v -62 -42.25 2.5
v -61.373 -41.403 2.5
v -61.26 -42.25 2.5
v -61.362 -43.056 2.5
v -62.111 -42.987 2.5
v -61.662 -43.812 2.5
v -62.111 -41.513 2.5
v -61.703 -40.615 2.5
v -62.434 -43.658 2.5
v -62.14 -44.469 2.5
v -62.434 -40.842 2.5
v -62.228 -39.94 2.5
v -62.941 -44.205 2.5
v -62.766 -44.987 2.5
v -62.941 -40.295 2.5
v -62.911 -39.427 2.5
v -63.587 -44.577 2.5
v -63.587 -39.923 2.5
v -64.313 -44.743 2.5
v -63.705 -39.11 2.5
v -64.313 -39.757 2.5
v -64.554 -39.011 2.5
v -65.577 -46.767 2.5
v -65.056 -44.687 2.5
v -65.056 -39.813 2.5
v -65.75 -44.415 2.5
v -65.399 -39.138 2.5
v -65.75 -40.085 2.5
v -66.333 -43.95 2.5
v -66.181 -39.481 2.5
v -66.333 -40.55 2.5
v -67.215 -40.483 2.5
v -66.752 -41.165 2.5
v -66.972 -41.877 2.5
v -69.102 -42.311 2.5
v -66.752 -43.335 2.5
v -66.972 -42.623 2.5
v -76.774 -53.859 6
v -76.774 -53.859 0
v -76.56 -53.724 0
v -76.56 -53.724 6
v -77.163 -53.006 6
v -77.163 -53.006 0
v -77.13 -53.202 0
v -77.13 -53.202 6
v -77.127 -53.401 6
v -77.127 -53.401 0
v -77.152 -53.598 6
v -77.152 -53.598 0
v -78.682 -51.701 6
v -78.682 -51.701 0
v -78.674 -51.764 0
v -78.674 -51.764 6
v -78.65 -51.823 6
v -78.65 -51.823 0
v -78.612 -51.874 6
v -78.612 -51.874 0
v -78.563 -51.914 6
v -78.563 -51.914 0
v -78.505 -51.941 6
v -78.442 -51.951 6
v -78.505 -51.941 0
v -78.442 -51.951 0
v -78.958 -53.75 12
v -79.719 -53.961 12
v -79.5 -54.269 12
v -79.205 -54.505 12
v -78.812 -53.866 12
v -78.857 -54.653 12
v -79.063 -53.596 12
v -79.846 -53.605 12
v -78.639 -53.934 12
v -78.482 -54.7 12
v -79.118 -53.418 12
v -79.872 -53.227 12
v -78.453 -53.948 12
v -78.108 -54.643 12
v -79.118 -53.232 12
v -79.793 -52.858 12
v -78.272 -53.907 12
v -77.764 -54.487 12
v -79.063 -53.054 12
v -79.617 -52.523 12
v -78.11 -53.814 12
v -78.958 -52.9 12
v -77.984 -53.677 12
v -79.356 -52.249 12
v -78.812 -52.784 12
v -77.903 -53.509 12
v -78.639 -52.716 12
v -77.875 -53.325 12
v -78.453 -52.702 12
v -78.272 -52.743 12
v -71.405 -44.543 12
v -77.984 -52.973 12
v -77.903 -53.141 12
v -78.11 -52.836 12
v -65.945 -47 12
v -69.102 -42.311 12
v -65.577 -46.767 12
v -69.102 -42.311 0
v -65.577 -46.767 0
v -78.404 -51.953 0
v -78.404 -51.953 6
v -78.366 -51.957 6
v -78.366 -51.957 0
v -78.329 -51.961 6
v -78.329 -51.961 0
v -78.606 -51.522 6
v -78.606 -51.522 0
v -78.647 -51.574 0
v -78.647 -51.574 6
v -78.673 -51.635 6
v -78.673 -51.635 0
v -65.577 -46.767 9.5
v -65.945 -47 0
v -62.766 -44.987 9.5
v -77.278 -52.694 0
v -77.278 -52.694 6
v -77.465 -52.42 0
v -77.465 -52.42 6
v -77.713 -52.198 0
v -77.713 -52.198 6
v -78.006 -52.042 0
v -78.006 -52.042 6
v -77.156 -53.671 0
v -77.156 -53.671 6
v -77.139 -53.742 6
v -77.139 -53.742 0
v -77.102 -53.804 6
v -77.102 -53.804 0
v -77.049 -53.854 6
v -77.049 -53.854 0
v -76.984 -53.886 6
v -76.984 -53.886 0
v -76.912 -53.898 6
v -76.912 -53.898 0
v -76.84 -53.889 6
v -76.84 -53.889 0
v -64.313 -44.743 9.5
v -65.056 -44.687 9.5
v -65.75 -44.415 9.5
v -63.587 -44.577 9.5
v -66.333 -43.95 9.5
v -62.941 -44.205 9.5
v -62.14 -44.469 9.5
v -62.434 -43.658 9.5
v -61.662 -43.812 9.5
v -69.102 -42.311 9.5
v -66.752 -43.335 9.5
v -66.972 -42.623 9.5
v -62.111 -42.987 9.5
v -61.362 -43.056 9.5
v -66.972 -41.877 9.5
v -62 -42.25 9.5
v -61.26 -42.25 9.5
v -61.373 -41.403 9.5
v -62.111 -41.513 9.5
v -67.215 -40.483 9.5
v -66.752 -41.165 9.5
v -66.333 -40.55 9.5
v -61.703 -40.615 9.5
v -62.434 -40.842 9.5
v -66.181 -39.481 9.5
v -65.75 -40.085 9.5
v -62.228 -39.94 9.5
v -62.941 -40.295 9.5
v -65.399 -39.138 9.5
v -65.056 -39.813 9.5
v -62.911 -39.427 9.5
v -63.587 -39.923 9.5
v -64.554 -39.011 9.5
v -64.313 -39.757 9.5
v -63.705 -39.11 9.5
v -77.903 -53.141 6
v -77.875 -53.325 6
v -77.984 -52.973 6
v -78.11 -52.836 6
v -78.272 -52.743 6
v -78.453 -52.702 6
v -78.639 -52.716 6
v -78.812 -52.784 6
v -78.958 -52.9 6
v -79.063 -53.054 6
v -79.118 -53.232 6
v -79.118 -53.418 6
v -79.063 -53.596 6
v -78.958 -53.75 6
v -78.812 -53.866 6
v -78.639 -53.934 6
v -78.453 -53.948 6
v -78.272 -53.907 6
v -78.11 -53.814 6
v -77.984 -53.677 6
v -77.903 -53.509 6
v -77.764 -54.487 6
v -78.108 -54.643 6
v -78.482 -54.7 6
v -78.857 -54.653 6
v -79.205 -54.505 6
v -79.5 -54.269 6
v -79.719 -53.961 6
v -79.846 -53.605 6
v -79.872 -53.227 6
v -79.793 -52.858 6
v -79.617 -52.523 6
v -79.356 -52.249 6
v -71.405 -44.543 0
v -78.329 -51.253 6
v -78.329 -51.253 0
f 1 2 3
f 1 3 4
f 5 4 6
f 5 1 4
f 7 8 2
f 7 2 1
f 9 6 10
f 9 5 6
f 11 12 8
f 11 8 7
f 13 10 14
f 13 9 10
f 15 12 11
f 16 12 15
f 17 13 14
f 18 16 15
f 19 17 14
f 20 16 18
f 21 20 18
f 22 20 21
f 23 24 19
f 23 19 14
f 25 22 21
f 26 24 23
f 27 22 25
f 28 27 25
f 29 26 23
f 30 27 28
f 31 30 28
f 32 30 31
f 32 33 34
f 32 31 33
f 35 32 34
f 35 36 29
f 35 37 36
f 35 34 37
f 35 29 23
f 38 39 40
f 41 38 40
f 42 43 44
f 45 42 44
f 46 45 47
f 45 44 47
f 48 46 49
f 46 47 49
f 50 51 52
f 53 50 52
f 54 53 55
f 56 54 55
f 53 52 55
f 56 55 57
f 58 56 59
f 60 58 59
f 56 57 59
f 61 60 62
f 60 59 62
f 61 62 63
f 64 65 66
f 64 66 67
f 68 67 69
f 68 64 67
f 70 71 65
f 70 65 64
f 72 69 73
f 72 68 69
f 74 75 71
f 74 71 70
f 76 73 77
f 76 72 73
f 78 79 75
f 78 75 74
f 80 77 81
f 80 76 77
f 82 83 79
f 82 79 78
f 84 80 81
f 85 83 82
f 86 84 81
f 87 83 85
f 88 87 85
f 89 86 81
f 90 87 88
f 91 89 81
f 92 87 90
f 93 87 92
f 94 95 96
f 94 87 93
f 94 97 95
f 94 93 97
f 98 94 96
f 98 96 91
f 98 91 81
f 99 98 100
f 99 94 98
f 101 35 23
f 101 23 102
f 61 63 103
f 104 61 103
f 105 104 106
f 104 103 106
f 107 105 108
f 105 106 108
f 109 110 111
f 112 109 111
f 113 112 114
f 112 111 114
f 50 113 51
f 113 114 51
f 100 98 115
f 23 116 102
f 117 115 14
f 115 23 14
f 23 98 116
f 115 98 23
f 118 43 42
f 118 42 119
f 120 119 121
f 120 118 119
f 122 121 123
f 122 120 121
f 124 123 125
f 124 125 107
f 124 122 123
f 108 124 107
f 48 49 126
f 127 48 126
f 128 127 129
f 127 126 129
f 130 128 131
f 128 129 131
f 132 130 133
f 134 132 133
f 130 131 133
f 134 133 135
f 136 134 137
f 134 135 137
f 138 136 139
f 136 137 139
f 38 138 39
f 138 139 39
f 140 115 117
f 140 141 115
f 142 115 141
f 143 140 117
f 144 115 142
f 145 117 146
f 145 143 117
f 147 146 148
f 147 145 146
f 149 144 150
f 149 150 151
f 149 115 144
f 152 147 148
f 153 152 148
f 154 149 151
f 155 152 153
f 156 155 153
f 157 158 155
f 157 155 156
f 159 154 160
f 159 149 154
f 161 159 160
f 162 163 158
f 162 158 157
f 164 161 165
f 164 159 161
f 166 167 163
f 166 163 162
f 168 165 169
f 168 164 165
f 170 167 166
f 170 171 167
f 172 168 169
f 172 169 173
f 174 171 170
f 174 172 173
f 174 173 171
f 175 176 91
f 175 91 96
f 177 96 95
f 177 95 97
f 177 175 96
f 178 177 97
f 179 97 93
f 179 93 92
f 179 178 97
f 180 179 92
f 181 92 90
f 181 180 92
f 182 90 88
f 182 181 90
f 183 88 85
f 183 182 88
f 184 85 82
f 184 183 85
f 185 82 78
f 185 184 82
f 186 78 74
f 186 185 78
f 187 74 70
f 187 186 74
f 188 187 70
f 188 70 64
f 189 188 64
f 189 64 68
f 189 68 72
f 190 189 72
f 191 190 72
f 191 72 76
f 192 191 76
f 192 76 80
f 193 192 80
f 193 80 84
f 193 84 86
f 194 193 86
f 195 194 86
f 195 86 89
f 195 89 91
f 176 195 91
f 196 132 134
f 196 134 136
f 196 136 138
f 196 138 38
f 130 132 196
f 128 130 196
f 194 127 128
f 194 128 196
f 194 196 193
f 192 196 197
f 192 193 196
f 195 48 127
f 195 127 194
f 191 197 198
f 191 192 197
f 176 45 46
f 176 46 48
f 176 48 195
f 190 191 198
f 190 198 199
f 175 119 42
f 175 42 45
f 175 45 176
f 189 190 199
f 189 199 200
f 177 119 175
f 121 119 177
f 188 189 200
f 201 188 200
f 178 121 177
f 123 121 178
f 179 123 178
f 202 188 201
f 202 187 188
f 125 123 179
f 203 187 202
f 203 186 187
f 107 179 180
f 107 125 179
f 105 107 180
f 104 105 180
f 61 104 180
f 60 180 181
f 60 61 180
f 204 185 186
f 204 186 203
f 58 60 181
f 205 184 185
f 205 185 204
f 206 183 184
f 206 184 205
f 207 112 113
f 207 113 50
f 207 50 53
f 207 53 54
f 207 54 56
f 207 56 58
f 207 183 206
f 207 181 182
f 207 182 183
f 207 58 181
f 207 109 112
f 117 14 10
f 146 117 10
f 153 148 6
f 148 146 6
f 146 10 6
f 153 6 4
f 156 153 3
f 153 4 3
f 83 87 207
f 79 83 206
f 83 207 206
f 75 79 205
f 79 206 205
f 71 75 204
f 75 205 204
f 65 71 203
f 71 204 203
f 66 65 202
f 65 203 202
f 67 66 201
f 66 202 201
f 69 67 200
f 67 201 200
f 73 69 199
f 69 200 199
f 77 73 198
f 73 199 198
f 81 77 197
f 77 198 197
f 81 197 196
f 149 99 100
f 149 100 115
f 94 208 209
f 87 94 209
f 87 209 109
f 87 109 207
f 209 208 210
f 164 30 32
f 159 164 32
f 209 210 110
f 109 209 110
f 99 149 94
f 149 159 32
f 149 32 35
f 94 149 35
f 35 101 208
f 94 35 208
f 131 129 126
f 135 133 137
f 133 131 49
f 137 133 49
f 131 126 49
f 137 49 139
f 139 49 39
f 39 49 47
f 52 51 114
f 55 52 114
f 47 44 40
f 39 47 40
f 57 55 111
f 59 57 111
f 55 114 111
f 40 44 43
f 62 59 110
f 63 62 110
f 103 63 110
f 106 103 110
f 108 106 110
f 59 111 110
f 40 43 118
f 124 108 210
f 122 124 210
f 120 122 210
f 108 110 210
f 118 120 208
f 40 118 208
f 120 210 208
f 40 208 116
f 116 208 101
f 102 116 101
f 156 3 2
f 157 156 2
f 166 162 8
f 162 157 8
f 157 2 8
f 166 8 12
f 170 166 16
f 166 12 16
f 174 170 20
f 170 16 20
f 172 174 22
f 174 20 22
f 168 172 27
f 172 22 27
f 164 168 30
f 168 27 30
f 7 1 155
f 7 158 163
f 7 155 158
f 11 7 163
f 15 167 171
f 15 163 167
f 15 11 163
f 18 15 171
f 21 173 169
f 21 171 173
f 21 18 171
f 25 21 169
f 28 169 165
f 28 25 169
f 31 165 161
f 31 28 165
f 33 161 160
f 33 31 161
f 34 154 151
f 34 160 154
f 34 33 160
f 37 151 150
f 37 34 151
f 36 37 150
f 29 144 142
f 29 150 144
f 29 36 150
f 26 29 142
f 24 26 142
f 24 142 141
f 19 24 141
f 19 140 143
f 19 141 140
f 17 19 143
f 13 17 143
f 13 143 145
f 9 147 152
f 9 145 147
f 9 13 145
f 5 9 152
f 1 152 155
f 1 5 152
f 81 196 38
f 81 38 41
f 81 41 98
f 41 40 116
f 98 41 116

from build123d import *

# Parameters (mm, degrees)
SKETCH_3_R               = 2.5
SKETCH_3_R_2             = 1.375
SKETCH_3_R_3             = 0.625
EXTRUDE_1_DEPTH          = 12
CUT_EXTRUDE_START        = -6
SKETCH_4_R               = 1.375
SKETCH_4_R_2             = 0.625
CUT_EXTRUDE_1_DEPTH      = 6
CUT_EXTRUDE_2_DEPTH      = 6
CUT_EXTRUDE_3_DEPTH      = 98.323451249
CUT_EXTRUDE_3_DEPTH_BACK = 98.323451249
SKETCH_9_W               = 7.034569735
SKETCH_9_H               = 2.5


with BuildPart() as part:
    # 草图3 → 凸台-拉伸1 (new body)
    # profile 1 of 4: a face of its own
    with BuildSketch(Plane.XY):
        with BuildLine():
            ThreePointArc((-61.260434814, -42.25), (-62.911250508, -39.426764685), (-66.181254237, -39.480854503))
            Line((-66.181254237, -39.480854503), (-67.215081256, -40.482765899))
            ThreePointArc((-67.215081256, -40.482765899), (-66.804847725, -44.526501605), (-62.766497887, -44.986741313))
            ThreePointArc((-62.766497887, -44.986741313), (-61.661816101, -43.8118882), (-61.260434814, -42.25))
        make_face()
        with Locations((-64.5, -42.25)):
            Circle(SKETCH_3_R, mode=Mode.SUBTRACT)
    # profile 2 of 4: a face of its own
    with BuildSketch(Plane.XY):
        with BuildLine():
            ThreePointArc((-62.766497887, -44.986741313), (-66.804847725, -44.526501605), (-67.215081256, -40.482765899))
            Line((-67.215081256, -40.482765899), (-71.404577544, -44.542926834))
            Line((-71.404577544, -44.542926834), (-68.869512223, -46.563873564))
            ThreePointArc((-68.869512223, -46.563873564), (-68.283195443, -46.88782244), (-67.622796748, -47))
            Line((-67.622796748, -47), (-65.944900832, -47))
            Line((-65.944900832, -47), (-62.766497887, -44.986741313))
        make_face()
    # profile 3 of 4: a face of its own
    with BuildSketch(Plane.XY):
        with Locations((-78.5, -53.325)):
            Circle(SKETCH_3_R_2)
        with Locations((-78.5, -53.325)):
            Circle(SKETCH_3_R_3, mode=Mode.SUBTRACT)
    # profile 4 of 4: a face of its own
    with BuildSketch(Plane.XY):
        with BuildLine():
            Line((-68.869512223, -46.563873564), (-71.404577544, -44.542926834))
            Line((-71.404577544, -44.542926834), (-79.356399518, -52.24926543))
            ThreePointArc((-79.356399518, -52.24926543), (-77.902892111, -52.086417274), (-77.125, -53.325))
            ThreePointArc((-77.125, -53.325), (-77.295362144, -53.987927323), (-77.764232924, -54.486581598))
            Line((-77.764232924, -54.486581598), (-65.944900832, -47))
            Line((-65.944900832, -47), (-67.622796748, -47))
            ThreePointArc((-67.622796748, -47), (-68.283195443, -46.88782244), (-68.869512223, -46.563873564))
        make_face()
    extrude(amount=EXTRUDE_1_DEPTH)

    # 草图4 → 切除-拉伸1 (cut)
    with BuildSketch(Plane.XY.offset(6).offset(CUT_EXTRUDE_START)):
        with Locations((-78.5, -53.325)):
            Circle(SKETCH_4_R)
        with Locations((-78.5, -53.325)):
            Circle(SKETCH_4_R_2, mode=Mode.SUBTRACT)
    extrude(amount=CUT_EXTRUDE_1_DEPTH, mode=Mode.SUBTRACT)

    # 草图5 → 切除-拉伸2 (cut)
    with BuildSketch(Plane(origin=(0, 0, 0), x_dir=(-1, 0, 0), z_dir=(0, 0, -1))):
        with BuildLine():
            Line((79.356399518, -52.24926543), (78.605866383, -51.521902256))
            ThreePointArc((78.605866383, -51.521902256), (78.66209541, -51.603950043), (78.681882496, -51.701428318))
            ThreePointArc((78.681882496, -51.701428318), (78.612326251, -51.874460255), (78.442362088, -51.951208578))
            ThreePointArc((78.442362088, -51.951208578), (78.926279835, -52.017746963), (79.356399518, -52.24926543))
        make_face()
        with BuildLine():
            Line((79.691485429, -51.10916302), (78.328547162, -51.10916302))
            Line((78.328547162, -51.10916302), (78.328547162, -51.253144251))
            Line((78.328547162, -51.253144251), (78.605866383, -51.521902256))
            Line((78.605866383, -51.521902256), (79.356399518, -52.24926543))
            ThreePointArc((79.356399518, -52.24926543), (78.926279835, -52.017746963), (78.442362088, -51.951208578))
            ThreePointArc((78.442362088, -51.951208578), (78.385355708, -51.954787722), (78.328547162, -51.960731359))
            Line((78.328547162, -51.960731359), (78.328547162, -52.568011757))
            Line((78.328547162, -52.568011757), (79.691485429, -52.568011757))
            Line((79.691485429, -52.568011757), (79.691485429, -51.10916302))
        make_face()
        with BuildLine():
            Line((76.773632808, -53.859117327), (76.559713092, -53.723616657))
            Line((76.559713092, -53.723616657), (76.559713092, -54.626372146))
            Line((76.559713092, -54.626372146), (77.832544784, -54.626372146))
            Line((77.832544784, -54.626372146), (77.832544784, -53.006023906))
            Line((77.832544784, -53.006023906), (77.162510093, -53.006023906))
            ThreePointArc((77.162510093, -53.006023906), (77.125199423, -53.301582625), (77.152422696, -53.598240569))
            ThreePointArc((77.152422696, -53.598240569), (77.36758294, -54.104908073), (77.764232924, -54.486581598))
            Line((77.764232924, -54.486581598), (76.773632808, -53.859117327))
        make_face()
        with BuildLine():
            ThreePointArc((77.152422696, -53.598240569), (77.049210108, -53.853814684), (76.773632808, -53.859117327))
            Line((76.773632808, -53.859117327), (77.764232924, -54.486581598))
            ThreePointArc((77.764232924, -54.486581598), (77.36758294, -54.104908073), (77.152422696, -53.598240569))
        make_face()
    extrude(amount=-CUT_EXTRUDE_2_DEPTH, mode=Mode.SUBTRACT)

    # 草图9 → 切除-拉伸3 (cut, two sides: drawn at the far end of the back side and taken through both)
    with BuildSketch(Plane(origin=(-4.269265018, 5.396813566, 0), x_dir=(-0.784272958804573, -0.6204159299114752, 0), z_dir=(0.6204159299114752, -0.784272958804573, 0)).offset(-CUT_EXTRUDE_3_DEPTH_BACK)):
        with Locations((76.928026692, -1.25)):
            Rectangle(SKETCH_9_W, SKETCH_9_H)
        Polygon((74.298785761, -9.5), (73.410741824, -9.5), (73.410741824, -12), (80.445311559, -12), (80.445311559, -9.5), align=None)
    extrude(amount=CUT_EXTRUDE_3_DEPTH + CUT_EXTRUDE_3_DEPTH_BACK, mode=Mode.SUBTRACT)


solid = part.part
